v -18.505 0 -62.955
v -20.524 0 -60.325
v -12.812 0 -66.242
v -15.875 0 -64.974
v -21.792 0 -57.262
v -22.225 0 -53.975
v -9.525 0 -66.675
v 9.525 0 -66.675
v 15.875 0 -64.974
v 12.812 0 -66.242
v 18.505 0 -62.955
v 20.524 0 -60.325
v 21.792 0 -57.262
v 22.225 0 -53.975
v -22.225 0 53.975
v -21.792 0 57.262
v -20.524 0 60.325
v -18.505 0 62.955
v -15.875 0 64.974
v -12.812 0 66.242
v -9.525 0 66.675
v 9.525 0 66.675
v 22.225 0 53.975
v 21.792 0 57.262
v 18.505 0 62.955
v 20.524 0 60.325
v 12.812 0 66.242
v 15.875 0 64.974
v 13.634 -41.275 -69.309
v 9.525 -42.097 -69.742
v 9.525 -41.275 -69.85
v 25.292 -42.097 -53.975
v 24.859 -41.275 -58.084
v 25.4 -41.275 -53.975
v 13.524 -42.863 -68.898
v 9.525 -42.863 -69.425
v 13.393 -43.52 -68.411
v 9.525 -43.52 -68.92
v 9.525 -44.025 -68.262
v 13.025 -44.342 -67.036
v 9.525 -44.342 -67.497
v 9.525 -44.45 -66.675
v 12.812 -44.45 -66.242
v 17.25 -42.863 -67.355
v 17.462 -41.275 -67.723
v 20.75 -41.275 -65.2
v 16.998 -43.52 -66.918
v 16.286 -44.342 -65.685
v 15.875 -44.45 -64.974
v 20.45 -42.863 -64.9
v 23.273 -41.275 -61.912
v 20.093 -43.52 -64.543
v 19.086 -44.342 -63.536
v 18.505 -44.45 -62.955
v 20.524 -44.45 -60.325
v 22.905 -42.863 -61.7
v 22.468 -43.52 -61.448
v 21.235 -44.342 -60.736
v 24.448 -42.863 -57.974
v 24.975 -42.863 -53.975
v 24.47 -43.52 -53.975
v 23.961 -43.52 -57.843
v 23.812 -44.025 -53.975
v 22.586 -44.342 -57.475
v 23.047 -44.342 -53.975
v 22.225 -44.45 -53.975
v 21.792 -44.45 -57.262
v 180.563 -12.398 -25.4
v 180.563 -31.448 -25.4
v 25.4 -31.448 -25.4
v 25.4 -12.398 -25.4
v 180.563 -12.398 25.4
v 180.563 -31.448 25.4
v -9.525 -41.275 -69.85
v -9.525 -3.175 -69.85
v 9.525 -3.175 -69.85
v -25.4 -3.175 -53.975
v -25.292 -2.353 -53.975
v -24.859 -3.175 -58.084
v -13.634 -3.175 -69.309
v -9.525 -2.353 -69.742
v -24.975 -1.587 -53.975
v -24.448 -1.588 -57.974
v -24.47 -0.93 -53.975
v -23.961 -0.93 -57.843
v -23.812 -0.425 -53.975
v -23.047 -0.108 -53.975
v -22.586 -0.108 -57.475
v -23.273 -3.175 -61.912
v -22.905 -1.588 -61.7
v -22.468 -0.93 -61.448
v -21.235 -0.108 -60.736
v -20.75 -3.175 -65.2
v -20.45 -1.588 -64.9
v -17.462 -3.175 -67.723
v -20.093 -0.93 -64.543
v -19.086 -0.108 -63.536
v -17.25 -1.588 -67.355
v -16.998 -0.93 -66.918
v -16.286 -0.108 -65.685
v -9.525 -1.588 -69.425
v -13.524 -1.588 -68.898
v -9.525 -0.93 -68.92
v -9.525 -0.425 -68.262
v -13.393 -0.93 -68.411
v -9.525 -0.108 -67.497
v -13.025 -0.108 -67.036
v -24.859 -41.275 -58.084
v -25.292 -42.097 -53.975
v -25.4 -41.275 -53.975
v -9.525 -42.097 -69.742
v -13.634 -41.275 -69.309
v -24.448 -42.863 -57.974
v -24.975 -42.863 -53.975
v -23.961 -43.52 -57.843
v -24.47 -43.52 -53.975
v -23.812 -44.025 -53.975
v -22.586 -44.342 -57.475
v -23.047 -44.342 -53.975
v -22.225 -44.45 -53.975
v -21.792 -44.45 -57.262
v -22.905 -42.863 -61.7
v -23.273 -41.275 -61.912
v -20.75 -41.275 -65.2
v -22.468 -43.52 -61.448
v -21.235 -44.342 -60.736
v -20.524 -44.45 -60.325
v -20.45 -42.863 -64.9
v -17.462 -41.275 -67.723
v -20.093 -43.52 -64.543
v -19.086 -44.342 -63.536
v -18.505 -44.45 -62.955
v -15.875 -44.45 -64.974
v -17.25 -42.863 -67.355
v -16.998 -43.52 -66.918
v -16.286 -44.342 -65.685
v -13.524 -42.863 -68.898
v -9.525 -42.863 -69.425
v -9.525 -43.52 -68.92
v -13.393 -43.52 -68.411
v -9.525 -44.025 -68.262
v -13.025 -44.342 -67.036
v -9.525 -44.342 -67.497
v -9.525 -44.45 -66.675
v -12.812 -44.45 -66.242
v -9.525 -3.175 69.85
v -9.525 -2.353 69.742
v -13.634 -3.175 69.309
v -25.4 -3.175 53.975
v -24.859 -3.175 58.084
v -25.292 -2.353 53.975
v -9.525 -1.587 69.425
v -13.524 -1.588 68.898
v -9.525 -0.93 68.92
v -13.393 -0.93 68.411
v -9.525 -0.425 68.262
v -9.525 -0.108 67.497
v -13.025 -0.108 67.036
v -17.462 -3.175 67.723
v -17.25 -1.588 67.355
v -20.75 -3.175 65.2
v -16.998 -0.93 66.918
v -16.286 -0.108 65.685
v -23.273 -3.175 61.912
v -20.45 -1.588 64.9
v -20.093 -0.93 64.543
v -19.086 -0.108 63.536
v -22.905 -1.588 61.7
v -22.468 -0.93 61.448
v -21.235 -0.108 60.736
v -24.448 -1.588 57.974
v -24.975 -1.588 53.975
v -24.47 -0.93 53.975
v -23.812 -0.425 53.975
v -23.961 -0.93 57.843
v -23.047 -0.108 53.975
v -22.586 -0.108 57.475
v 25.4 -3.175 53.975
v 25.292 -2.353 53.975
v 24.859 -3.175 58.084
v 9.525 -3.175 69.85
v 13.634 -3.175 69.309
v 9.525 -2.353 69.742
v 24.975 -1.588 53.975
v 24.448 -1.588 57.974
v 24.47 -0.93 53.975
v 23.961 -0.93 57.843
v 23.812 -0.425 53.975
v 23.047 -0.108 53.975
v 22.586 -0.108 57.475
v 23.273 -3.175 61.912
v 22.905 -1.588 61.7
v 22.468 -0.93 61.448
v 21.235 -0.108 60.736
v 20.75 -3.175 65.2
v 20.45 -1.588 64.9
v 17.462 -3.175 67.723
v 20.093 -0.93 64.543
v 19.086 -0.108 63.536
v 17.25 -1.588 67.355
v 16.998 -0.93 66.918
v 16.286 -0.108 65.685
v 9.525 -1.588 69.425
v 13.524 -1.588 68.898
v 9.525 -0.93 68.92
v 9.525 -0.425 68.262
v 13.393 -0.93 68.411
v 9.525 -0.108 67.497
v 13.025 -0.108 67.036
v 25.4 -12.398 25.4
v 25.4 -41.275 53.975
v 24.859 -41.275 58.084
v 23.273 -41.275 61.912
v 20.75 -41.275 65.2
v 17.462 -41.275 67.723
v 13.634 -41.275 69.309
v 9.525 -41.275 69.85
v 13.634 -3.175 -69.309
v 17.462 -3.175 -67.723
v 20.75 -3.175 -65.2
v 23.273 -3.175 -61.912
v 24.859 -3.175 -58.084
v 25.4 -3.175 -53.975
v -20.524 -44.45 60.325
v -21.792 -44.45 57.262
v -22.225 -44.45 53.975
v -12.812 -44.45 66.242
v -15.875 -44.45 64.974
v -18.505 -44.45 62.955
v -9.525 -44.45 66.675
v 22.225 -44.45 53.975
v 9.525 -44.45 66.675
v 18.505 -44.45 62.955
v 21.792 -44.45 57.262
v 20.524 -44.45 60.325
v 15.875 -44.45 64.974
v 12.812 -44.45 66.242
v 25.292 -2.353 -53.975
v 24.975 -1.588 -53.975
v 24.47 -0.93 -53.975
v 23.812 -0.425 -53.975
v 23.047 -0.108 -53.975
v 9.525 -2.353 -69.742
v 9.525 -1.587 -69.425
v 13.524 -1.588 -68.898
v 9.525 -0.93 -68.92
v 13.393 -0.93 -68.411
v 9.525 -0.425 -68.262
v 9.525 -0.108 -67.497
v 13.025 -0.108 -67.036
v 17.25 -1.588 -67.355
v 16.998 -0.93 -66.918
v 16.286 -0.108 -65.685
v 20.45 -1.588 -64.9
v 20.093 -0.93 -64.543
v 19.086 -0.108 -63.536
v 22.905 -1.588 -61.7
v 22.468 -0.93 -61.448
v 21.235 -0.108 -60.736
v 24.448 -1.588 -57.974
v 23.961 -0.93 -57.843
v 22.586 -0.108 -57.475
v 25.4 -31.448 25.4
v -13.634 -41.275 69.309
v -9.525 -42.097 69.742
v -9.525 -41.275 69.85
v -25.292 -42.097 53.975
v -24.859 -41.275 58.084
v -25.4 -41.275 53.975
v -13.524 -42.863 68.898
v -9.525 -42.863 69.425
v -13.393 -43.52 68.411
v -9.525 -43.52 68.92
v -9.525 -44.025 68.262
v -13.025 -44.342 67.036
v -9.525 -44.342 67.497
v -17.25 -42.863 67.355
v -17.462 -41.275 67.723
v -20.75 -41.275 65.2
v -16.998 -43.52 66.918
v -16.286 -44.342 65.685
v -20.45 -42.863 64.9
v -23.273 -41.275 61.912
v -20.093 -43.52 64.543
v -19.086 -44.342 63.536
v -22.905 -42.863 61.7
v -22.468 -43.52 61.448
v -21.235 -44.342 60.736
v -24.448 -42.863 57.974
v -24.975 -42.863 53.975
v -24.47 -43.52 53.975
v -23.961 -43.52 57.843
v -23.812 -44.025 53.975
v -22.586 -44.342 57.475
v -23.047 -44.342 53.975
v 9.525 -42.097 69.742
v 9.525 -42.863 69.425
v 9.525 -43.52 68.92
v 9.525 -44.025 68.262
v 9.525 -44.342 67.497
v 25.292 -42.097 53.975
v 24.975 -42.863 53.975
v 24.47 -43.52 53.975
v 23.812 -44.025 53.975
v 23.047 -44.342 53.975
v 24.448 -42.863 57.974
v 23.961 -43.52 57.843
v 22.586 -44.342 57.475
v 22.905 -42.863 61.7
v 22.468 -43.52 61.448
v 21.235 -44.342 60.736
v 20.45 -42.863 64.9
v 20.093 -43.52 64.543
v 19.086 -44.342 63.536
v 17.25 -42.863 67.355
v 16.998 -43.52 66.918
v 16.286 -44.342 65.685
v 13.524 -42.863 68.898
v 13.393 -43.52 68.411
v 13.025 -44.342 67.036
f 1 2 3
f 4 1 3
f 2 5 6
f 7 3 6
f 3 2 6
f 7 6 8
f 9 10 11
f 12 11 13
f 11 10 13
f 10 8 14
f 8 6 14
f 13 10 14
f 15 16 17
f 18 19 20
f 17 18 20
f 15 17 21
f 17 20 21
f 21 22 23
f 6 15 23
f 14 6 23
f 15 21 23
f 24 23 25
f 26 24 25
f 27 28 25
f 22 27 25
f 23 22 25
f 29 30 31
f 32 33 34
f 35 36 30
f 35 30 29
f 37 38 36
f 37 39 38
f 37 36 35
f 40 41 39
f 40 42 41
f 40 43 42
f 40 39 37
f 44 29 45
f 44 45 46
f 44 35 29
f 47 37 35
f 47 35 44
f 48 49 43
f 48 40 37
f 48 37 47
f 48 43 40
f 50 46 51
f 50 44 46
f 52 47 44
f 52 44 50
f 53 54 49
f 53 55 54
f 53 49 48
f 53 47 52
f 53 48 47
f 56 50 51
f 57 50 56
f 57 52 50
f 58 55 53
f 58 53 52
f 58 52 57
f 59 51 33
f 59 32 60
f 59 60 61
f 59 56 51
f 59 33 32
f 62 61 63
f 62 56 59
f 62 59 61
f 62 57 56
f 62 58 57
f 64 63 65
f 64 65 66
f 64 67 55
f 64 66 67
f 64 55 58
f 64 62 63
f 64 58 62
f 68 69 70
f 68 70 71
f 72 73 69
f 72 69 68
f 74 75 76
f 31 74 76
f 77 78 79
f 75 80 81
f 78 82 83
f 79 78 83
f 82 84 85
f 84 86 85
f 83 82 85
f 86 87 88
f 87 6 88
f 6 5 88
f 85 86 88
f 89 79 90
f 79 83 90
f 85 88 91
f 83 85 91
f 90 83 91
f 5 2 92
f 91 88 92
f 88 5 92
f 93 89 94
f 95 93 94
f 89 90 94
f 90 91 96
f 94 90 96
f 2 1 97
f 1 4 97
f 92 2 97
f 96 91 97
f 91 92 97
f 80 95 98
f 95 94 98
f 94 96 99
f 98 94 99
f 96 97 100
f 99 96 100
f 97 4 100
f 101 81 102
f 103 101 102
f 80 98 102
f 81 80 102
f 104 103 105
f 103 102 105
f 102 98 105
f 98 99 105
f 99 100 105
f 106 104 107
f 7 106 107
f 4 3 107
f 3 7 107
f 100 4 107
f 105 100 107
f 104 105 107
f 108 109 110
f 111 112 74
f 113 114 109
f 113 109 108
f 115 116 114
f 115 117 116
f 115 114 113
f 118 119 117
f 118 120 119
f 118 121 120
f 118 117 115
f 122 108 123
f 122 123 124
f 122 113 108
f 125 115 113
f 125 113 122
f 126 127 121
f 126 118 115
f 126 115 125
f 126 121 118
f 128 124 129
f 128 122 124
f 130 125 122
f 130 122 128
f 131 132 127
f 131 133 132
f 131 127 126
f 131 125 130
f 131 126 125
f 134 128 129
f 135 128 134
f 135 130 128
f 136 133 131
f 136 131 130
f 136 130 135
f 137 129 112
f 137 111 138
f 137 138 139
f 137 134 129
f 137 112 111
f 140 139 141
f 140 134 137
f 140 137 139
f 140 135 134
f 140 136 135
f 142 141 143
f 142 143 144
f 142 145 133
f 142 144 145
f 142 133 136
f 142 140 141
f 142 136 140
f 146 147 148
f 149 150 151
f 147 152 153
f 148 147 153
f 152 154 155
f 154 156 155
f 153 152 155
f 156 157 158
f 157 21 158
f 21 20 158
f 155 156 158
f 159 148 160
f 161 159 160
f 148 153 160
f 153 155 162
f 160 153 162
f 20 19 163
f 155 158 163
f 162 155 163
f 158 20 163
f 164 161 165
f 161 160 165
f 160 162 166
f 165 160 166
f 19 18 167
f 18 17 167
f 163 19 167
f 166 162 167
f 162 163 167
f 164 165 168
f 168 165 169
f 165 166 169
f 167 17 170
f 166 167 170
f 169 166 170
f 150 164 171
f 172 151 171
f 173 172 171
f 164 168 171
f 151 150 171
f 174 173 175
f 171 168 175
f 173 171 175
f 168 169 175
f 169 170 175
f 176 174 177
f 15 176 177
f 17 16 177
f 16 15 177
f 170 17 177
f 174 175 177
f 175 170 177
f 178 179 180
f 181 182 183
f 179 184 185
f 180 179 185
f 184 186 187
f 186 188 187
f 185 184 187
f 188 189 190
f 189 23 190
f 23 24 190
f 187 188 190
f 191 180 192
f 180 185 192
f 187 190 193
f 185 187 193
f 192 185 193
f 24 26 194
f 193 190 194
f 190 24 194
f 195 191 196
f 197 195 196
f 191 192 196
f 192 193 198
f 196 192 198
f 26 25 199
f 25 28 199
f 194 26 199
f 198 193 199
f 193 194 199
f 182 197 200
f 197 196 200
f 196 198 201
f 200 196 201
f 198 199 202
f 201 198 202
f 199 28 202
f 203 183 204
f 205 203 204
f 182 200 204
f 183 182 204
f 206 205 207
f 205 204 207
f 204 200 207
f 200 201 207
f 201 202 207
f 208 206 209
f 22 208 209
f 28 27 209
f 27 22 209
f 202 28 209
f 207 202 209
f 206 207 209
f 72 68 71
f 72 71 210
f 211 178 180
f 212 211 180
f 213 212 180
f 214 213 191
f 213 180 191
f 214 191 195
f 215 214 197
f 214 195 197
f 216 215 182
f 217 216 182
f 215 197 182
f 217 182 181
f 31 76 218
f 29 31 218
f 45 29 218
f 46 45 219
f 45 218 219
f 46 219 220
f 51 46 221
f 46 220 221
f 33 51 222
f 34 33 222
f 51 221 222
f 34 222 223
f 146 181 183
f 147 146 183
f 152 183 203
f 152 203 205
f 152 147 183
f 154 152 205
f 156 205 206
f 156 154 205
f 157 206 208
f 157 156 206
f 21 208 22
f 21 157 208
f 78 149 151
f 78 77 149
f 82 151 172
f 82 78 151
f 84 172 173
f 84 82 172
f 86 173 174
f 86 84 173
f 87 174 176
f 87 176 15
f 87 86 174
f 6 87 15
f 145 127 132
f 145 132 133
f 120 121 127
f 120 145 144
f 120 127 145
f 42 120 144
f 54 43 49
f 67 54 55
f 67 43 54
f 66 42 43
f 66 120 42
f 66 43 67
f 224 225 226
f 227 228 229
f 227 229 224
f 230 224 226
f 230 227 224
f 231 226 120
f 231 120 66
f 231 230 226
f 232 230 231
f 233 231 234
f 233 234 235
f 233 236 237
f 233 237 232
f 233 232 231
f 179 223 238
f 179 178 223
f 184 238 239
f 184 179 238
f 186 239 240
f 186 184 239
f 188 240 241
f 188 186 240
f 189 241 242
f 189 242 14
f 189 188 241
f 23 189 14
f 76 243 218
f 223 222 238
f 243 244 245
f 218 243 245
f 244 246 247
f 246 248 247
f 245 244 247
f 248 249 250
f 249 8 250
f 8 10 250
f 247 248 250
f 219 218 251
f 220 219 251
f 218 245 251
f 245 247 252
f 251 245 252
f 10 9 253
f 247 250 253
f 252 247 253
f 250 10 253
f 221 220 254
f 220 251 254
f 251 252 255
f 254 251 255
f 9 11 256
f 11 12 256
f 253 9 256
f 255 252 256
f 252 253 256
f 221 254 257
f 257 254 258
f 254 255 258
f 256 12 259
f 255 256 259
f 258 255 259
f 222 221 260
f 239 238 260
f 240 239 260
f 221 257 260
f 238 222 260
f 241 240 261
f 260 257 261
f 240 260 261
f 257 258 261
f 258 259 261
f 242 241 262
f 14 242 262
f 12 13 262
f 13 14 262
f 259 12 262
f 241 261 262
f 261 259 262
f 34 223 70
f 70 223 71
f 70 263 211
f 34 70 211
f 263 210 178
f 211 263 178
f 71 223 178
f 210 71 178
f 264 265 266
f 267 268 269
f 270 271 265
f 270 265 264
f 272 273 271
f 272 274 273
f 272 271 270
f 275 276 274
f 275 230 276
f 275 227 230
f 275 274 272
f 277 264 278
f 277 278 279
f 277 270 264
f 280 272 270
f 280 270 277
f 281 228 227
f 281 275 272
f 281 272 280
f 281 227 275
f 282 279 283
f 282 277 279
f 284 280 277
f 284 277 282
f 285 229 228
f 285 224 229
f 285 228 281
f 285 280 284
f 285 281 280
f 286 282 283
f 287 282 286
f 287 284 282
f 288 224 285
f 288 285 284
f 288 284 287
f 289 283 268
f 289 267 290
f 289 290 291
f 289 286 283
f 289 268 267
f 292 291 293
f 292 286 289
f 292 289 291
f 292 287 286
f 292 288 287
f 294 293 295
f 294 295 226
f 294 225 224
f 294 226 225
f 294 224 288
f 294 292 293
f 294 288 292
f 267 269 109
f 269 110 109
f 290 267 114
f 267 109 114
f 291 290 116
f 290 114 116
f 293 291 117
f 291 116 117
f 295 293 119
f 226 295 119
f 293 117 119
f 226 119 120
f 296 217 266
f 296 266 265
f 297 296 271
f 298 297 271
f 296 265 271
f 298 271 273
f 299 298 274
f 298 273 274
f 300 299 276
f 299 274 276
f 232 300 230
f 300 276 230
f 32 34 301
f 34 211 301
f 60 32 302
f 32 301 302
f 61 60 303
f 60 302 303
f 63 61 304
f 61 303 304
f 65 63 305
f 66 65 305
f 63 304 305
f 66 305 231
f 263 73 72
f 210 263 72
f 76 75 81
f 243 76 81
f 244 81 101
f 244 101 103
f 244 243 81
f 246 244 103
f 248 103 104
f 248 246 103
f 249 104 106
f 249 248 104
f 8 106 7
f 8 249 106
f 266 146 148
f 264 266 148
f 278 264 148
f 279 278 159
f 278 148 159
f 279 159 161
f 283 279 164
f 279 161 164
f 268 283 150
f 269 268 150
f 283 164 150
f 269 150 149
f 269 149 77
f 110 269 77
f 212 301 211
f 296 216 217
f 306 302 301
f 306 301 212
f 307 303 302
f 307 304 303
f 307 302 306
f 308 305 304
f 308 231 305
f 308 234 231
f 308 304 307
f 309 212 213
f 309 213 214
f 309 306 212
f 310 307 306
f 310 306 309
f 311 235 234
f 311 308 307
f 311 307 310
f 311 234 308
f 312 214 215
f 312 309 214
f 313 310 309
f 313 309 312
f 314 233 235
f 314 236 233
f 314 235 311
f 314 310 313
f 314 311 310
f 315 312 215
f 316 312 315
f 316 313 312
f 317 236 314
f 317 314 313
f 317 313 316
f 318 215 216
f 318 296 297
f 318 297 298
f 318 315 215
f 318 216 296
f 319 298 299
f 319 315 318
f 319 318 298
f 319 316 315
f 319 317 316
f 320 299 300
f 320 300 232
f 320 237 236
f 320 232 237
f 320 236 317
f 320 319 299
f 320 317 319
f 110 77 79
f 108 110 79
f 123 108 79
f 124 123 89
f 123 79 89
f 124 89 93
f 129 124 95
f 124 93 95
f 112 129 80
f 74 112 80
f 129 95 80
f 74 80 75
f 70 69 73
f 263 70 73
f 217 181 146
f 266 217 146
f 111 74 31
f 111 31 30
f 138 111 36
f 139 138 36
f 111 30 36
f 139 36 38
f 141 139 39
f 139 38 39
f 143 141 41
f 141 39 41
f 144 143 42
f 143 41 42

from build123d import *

# Parameters (mm, degrees)
F1_DEPTH = 44.45
F2_R     = 3.175
F3_W     = 19.05
F3_H     = 50.8
F4_DEPTH = 155.1632549


# Not quite as in the source:
# - an extrude ends at something that could not be found from the text; its depth is read off the source's solid


with BuildPart() as f1:
    # F0 (on Front) → F1 (new body)
    with BuildSketch(Plane.XZ):
        with BuildLine():
            Line((9.525, 69.85), (-9.525, 69.85))
            ThreePointArc((-9.525, 69.85), (-20.7503201513, 65.2003201513), (-25.4, 53.975))
            Line((-25.4, 53.975), (-25.4, -53.975))
            ThreePointArc((-25.4, -53.975), (-20.7503201513, -65.2003201513), (-9.525, -69.85))
            Line((-9.525, -69.85), (9.525, -69.85))
            ThreePointArc((9.525, -69.85), (20.7503201513, -65.2003201513), (25.4, -53.975))
            Line((25.4, -53.975), (25.4, 53.975))
            ThreePointArc((25.4, 53.975), (20.7503201513, 65.2003201513), (9.525, 69.85))
        make_face()
    extrude(amount=F1_DEPTH)

    # F2
    f2_edges = [f1.edges().sort_by_distance(p)[0] for p in [
        (0, -44.45, 69.85),
        (20.75032, 0, 65.20032),
        (0, 0, 69.85),
        (-20.75032, 0, 65.20032),
        (-20.75032, -44.45, 65.20032),
        (-25.4, 0, 0),
        (-25.4, -44.45, 0),
        (-20.75032, 0, -65.20032),
        (-20.75032, -44.45, -65.20032),
        (0, 0, -69.85),
        (0, -44.45, -69.85),
        (20.75032, 0, -65.20032),
        (20.75032, -44.45, -65.20032),
        (25.4, 0, 0),
        (25.4, -44.45, 0),
        (20.75032, -44.45, 65.20032),
    ]]
    fillet(f2_edges, radius=F2_R)

    # F3 (on face) → F4 (join, through all)
    with BuildSketch(Plane.YZ.offset(25.4)):
        with Locations((-21.9233557582, 0)):
            Rectangle(F3_W, F3_H)
    extrude(amount=F4_DEPTH)


solid = f1.part
